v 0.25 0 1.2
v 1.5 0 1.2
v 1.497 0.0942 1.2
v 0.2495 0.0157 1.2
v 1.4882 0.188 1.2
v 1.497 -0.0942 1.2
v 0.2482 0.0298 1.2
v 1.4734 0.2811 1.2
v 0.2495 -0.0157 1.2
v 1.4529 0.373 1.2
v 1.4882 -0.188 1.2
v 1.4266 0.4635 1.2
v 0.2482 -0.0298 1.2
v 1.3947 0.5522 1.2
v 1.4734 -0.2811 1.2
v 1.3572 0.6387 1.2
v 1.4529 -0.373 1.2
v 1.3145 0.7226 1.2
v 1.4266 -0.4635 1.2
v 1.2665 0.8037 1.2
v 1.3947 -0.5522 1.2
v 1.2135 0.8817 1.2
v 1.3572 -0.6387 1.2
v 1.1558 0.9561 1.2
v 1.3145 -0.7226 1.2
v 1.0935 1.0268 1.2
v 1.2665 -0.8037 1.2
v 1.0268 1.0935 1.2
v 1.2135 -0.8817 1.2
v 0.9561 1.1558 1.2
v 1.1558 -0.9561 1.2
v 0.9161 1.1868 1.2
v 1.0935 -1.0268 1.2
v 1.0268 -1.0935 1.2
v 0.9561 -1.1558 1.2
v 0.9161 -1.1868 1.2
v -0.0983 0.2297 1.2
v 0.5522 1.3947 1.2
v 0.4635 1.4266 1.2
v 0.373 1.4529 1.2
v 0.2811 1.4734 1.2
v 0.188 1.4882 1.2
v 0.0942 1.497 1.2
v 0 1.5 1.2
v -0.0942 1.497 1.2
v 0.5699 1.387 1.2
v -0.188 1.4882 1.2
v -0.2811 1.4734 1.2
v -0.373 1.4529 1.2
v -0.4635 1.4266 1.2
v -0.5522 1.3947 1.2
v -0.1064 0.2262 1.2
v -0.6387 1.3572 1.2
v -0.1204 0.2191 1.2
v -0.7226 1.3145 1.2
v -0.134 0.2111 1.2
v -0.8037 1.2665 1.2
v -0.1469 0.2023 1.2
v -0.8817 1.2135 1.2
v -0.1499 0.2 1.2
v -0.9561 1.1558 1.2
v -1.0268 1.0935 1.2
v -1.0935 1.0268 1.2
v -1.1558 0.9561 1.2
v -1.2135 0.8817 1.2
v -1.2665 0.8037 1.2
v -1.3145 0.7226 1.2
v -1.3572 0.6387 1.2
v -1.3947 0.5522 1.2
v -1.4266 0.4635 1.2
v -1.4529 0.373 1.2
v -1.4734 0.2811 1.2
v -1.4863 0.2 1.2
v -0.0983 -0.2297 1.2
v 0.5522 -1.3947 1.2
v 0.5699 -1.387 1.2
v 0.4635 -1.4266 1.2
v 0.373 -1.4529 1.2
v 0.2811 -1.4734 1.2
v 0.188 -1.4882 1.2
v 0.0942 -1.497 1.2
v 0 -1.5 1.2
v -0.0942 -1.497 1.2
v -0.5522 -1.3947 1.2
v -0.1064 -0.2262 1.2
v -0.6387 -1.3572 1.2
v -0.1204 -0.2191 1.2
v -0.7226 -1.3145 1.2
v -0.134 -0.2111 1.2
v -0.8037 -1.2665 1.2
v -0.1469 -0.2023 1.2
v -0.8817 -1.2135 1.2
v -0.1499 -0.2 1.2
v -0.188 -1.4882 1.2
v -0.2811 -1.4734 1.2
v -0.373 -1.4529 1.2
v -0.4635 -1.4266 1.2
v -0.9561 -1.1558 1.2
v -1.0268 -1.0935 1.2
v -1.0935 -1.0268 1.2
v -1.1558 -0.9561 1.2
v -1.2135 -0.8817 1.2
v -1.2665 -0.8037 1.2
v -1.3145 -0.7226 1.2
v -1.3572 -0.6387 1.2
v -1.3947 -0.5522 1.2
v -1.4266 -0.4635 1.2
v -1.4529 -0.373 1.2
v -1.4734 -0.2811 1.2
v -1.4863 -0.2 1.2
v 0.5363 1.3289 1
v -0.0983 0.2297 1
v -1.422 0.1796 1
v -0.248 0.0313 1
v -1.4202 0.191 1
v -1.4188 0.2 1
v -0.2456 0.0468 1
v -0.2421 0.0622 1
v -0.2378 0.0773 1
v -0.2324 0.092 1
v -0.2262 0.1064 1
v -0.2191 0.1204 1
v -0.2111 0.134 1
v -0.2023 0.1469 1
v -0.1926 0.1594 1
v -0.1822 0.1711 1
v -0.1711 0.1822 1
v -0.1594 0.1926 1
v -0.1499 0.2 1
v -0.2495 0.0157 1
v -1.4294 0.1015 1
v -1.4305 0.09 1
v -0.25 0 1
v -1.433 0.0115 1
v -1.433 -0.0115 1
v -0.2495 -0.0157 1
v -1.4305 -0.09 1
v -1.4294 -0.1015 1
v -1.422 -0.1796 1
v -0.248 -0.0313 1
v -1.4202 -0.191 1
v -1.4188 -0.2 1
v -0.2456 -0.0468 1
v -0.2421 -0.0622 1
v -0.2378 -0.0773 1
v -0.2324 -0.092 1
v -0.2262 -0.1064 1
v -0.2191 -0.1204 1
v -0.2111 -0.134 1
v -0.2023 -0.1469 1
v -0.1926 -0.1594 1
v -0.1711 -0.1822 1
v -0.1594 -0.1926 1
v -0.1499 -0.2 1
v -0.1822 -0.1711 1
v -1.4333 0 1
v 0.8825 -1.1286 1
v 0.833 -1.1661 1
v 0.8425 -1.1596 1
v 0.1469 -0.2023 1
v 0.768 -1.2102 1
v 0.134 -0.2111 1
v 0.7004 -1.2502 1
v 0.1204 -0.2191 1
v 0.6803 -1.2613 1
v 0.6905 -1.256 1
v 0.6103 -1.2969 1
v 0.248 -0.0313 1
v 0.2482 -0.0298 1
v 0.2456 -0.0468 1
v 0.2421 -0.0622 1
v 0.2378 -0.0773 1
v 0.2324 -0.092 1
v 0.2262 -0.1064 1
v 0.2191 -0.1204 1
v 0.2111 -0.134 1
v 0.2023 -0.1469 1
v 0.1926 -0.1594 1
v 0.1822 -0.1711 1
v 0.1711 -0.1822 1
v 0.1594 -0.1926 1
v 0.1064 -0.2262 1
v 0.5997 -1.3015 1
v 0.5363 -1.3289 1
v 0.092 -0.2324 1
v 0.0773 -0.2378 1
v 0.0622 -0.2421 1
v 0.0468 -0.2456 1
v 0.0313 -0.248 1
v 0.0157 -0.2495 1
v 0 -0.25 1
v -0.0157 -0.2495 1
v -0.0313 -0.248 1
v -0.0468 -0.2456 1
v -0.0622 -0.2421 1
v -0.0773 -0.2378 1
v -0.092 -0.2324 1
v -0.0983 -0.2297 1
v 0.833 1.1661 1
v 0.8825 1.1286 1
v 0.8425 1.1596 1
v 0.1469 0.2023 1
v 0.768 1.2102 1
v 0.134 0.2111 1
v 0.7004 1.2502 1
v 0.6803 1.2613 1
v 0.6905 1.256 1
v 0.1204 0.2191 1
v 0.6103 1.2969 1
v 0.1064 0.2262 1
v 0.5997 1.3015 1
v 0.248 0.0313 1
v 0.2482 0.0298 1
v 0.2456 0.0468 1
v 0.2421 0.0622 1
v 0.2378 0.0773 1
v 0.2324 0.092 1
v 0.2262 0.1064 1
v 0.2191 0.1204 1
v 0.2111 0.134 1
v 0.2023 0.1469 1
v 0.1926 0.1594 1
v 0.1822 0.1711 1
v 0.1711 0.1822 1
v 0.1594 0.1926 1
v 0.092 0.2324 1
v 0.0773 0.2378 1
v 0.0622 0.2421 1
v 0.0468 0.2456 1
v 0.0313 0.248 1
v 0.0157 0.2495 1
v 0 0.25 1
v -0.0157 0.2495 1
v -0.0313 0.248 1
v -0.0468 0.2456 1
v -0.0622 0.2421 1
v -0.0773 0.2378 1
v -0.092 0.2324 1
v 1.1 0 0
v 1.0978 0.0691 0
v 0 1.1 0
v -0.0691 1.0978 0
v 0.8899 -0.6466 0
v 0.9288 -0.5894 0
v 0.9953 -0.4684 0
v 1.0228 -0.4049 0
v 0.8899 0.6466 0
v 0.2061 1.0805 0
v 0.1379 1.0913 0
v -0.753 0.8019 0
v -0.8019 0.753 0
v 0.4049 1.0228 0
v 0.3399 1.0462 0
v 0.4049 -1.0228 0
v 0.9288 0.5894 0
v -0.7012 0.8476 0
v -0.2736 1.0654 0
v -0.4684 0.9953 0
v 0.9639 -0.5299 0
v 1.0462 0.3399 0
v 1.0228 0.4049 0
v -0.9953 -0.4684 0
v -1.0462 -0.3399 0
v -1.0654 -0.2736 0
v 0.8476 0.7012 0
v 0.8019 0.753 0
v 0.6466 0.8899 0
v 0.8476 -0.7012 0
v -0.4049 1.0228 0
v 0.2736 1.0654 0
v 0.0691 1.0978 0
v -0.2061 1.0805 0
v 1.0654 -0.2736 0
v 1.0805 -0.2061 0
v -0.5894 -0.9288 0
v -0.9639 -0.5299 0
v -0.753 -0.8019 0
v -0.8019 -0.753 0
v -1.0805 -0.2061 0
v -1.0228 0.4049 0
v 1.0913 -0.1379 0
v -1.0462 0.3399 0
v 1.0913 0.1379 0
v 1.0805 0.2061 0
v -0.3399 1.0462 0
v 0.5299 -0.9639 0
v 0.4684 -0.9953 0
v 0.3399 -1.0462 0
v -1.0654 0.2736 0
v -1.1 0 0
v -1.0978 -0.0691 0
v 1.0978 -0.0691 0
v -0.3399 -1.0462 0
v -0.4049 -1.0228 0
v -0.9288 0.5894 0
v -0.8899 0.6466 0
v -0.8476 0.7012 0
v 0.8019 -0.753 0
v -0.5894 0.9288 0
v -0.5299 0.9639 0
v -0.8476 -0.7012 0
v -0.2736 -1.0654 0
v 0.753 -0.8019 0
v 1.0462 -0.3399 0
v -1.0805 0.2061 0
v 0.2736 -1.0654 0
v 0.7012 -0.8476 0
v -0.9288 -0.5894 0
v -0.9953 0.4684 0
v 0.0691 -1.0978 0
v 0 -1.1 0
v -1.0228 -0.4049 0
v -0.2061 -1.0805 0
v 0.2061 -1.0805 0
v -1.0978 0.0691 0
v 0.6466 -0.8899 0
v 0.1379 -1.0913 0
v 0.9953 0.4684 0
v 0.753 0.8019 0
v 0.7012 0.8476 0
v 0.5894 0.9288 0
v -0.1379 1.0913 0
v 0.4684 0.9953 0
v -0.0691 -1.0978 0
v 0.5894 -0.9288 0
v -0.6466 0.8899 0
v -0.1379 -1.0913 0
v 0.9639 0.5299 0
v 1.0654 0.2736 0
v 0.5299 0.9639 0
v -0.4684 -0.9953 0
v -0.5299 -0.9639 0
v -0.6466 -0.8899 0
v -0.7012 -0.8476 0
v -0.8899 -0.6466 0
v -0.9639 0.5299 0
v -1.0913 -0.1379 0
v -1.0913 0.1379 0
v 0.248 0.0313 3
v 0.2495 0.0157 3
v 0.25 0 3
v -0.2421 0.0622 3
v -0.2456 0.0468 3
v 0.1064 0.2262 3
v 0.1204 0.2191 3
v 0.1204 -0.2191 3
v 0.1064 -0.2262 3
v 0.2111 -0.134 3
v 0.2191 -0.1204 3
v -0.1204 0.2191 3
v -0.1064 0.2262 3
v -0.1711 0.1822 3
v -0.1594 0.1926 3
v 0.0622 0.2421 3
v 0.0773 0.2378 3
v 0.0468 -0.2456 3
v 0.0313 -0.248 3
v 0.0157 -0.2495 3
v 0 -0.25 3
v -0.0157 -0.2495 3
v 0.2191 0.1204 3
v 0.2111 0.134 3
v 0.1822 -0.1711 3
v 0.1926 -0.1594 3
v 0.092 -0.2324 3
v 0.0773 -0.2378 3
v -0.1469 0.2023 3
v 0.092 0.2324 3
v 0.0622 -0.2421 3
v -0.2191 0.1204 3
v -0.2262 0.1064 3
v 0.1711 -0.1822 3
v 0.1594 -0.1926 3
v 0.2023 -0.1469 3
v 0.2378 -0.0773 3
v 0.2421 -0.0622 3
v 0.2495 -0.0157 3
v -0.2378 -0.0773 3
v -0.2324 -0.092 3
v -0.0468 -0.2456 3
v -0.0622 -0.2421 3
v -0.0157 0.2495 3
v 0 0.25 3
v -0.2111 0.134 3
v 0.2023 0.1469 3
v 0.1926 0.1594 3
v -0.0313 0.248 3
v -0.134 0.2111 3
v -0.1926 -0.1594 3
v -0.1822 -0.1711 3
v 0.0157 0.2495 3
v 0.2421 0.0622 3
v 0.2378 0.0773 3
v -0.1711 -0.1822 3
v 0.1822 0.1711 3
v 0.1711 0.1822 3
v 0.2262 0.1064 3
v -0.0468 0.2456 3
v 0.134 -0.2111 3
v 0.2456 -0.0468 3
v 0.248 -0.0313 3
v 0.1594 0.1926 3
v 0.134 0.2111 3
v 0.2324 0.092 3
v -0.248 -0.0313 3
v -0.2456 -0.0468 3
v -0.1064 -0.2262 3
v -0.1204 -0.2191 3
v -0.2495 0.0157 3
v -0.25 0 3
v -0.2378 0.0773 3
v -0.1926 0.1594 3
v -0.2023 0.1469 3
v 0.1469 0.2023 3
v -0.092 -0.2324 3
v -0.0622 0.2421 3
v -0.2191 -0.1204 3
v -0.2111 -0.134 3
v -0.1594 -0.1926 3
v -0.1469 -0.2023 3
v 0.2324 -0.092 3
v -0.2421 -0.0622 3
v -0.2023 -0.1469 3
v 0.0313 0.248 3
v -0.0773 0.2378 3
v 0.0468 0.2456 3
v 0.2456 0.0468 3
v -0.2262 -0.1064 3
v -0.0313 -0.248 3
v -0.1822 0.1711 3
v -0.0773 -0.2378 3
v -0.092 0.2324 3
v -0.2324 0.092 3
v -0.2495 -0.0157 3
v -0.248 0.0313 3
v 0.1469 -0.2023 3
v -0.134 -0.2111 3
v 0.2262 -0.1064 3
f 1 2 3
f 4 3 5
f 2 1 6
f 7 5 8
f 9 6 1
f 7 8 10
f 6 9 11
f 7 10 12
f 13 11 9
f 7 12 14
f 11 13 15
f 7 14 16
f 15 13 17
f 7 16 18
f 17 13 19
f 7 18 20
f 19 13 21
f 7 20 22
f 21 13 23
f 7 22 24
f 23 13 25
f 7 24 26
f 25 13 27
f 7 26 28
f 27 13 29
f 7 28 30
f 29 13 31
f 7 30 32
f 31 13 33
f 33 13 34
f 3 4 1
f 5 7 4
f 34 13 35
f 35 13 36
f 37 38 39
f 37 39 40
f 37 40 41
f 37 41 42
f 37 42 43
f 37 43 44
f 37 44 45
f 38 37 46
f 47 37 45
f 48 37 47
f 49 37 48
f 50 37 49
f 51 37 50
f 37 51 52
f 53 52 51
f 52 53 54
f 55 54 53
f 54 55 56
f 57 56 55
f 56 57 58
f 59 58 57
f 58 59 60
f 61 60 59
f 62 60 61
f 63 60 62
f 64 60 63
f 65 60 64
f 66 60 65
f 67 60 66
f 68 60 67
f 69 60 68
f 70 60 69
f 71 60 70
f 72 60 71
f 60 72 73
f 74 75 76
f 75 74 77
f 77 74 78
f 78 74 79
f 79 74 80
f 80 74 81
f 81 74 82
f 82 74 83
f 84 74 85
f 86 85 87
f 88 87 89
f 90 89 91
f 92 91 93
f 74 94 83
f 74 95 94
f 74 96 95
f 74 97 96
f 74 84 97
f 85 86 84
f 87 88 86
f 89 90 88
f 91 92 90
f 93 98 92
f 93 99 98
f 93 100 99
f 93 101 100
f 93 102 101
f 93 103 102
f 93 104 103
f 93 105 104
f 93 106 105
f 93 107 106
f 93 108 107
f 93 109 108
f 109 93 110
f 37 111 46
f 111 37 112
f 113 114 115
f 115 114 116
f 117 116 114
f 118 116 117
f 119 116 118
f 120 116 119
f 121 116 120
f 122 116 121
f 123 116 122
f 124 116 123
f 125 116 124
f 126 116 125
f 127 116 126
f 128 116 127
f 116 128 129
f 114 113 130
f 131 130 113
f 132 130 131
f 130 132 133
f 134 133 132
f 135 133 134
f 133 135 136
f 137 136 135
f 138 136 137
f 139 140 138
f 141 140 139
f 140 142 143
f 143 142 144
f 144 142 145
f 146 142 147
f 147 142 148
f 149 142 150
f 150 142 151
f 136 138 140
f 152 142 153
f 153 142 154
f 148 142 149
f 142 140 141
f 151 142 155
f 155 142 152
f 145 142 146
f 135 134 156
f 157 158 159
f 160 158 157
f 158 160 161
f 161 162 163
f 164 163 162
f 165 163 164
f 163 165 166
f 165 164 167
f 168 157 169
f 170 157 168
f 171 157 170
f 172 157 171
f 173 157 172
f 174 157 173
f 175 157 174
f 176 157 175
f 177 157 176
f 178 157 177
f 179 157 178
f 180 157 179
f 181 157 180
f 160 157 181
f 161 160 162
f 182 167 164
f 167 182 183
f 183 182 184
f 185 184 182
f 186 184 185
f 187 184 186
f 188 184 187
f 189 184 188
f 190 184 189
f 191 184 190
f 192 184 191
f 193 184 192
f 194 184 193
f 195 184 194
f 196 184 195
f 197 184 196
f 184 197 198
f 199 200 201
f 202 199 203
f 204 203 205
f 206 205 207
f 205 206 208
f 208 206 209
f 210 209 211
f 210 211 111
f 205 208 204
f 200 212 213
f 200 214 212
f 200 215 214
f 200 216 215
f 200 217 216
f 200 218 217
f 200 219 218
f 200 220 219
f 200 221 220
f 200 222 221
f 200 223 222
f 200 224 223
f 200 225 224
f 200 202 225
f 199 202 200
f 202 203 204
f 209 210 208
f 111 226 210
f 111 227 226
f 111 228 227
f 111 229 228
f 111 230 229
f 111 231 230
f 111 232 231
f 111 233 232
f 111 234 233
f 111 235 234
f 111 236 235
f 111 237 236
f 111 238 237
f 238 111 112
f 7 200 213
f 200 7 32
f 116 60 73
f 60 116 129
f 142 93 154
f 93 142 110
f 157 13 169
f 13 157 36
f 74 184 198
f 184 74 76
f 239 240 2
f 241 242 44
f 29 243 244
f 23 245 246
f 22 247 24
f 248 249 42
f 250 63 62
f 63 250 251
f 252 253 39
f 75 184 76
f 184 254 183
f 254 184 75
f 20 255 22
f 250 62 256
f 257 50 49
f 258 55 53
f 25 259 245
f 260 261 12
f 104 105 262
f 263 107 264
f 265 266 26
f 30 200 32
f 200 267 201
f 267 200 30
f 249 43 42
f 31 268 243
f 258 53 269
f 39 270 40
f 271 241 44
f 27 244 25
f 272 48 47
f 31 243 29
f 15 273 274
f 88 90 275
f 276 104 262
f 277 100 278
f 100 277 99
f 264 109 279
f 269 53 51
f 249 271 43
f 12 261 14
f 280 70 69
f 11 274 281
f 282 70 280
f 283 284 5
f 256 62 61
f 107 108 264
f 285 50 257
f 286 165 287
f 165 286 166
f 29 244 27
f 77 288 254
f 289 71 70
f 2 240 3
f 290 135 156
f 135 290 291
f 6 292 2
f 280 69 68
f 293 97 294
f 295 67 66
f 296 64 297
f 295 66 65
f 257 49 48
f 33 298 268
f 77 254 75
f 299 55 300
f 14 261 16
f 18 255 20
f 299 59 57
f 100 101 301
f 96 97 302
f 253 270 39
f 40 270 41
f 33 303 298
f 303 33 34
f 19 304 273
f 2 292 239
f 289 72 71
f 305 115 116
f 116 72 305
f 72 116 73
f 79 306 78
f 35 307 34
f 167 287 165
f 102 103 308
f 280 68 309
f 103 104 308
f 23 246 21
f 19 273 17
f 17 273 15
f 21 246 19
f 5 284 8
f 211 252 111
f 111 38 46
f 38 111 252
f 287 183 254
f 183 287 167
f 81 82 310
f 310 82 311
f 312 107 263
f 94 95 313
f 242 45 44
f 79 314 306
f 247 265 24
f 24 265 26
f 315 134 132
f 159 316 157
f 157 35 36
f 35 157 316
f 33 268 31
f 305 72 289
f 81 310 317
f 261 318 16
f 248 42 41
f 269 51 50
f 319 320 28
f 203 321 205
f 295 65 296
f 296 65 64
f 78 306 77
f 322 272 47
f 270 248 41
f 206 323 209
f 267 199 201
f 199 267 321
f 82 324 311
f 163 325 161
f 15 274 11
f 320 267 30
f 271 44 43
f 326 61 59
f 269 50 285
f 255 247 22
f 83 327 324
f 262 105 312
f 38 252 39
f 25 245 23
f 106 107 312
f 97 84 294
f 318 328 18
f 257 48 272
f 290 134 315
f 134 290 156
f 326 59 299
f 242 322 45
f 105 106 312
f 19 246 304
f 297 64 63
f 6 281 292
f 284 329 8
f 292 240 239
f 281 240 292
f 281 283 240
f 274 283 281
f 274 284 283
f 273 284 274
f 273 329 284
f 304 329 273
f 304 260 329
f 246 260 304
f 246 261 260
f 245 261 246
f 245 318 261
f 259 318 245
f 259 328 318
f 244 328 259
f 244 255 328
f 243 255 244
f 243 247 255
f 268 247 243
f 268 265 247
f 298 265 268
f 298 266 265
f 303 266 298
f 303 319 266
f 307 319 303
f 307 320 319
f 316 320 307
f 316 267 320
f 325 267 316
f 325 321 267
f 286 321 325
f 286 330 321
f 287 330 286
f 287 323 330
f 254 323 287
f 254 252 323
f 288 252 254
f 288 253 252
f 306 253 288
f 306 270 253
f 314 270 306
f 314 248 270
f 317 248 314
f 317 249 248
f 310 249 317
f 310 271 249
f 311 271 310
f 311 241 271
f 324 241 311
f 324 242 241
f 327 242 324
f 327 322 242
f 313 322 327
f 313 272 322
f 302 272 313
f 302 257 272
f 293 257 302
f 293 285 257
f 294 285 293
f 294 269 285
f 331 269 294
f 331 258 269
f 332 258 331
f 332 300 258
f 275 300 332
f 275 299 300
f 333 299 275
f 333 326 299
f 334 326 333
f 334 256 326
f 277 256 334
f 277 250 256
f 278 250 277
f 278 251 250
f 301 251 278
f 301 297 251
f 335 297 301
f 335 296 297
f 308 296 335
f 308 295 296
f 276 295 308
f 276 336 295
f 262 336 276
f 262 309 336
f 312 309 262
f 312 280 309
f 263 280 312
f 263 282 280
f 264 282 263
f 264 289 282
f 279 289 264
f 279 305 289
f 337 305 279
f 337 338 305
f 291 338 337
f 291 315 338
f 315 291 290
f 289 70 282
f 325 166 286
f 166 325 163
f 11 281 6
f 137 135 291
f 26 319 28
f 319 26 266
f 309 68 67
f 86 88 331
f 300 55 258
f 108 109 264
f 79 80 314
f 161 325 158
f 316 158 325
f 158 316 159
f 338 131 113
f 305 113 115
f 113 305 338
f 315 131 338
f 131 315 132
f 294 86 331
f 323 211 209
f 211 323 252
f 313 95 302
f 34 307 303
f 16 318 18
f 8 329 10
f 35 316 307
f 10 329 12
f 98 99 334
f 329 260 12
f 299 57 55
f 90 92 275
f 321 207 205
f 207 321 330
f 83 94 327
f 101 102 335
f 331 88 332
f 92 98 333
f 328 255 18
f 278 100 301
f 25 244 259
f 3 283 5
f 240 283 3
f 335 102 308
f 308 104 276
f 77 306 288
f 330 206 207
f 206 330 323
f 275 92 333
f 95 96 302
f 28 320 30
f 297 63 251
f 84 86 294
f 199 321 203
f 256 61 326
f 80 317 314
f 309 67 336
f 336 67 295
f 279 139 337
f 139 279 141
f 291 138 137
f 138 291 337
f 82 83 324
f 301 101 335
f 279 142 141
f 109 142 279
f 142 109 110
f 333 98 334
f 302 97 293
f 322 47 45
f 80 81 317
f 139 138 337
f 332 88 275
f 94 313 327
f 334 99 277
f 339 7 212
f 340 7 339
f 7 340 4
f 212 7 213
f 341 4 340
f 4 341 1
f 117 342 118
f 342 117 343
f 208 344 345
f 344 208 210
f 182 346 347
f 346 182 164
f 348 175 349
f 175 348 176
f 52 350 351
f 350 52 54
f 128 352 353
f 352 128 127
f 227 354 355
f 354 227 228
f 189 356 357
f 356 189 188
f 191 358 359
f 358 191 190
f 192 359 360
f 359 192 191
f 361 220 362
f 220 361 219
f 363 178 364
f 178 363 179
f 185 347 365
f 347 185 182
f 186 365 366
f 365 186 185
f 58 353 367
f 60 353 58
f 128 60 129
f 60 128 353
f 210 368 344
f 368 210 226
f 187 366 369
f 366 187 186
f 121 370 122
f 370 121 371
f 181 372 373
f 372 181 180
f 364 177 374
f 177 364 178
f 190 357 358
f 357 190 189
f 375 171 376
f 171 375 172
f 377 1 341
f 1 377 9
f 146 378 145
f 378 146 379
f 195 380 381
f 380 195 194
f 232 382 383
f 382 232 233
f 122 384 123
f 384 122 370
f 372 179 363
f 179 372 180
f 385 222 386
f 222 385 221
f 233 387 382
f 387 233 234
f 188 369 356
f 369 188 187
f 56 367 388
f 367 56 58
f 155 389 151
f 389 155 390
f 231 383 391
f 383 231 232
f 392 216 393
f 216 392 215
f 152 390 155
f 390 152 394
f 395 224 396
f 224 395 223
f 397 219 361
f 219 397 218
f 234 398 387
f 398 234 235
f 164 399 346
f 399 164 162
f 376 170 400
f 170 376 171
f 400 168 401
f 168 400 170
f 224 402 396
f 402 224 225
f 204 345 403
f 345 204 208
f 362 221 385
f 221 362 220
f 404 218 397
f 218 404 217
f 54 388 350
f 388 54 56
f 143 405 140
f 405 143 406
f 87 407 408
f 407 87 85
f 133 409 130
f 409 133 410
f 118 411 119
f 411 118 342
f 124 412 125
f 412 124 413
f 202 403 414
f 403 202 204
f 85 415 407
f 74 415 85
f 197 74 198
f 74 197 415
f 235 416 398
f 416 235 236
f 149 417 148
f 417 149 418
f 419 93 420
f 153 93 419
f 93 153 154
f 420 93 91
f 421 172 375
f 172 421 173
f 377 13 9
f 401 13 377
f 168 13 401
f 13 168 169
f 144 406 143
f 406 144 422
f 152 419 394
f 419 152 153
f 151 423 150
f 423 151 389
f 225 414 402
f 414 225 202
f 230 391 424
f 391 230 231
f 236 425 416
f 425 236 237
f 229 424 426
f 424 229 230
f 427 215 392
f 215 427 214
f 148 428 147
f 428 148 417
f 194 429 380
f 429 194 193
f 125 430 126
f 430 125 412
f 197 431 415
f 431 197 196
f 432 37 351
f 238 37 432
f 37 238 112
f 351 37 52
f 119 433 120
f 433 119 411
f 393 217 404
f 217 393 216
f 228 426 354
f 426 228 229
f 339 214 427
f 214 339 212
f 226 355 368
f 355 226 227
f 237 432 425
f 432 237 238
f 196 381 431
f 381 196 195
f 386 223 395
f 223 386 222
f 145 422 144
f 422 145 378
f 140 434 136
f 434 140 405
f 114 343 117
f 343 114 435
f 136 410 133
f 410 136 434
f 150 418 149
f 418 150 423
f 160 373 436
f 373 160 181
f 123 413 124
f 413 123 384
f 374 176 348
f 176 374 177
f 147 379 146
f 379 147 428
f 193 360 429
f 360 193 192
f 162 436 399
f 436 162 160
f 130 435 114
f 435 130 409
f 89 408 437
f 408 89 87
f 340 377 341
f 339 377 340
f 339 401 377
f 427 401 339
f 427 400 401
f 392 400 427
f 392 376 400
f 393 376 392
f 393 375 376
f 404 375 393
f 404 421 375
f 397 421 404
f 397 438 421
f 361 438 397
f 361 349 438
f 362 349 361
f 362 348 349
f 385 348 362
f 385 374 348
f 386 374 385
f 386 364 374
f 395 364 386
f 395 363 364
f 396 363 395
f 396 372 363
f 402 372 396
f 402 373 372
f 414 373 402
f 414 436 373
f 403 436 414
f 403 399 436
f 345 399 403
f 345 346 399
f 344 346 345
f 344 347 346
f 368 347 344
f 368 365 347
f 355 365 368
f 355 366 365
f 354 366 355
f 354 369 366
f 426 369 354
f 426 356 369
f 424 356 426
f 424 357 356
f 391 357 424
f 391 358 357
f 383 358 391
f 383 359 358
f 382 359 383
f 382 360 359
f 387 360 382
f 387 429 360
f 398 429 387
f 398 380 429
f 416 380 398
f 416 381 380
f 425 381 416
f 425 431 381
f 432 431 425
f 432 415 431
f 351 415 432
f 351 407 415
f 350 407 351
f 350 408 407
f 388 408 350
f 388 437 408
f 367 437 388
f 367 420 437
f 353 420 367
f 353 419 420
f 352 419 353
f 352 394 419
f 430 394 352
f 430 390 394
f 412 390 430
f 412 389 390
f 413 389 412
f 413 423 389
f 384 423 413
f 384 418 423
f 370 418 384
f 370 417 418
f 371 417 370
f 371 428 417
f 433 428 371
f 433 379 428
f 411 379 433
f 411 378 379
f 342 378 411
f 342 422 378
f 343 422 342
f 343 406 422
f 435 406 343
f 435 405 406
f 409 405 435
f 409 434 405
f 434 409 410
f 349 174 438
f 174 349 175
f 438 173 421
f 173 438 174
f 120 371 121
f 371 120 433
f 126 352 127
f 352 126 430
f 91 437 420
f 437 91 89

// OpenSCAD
$fn=100;
hubTop = 1.5;        // hub radius top  
shaftRadius = 0.4;   // motor shaft radius
tipHeight = 1.2;
difference() {
    cylinder(tipHeight,r2=hubTop,r1=hubTop-0.4);
    for (j = [60:120:300]) {
        rotate([0,0,j]) translate([0,-0.2,tipHeight-0.2]) cube([hubTop+0.4,0.4,0.2]);
    }
}
cylinder(3,r=shaftRadius-0.15);
